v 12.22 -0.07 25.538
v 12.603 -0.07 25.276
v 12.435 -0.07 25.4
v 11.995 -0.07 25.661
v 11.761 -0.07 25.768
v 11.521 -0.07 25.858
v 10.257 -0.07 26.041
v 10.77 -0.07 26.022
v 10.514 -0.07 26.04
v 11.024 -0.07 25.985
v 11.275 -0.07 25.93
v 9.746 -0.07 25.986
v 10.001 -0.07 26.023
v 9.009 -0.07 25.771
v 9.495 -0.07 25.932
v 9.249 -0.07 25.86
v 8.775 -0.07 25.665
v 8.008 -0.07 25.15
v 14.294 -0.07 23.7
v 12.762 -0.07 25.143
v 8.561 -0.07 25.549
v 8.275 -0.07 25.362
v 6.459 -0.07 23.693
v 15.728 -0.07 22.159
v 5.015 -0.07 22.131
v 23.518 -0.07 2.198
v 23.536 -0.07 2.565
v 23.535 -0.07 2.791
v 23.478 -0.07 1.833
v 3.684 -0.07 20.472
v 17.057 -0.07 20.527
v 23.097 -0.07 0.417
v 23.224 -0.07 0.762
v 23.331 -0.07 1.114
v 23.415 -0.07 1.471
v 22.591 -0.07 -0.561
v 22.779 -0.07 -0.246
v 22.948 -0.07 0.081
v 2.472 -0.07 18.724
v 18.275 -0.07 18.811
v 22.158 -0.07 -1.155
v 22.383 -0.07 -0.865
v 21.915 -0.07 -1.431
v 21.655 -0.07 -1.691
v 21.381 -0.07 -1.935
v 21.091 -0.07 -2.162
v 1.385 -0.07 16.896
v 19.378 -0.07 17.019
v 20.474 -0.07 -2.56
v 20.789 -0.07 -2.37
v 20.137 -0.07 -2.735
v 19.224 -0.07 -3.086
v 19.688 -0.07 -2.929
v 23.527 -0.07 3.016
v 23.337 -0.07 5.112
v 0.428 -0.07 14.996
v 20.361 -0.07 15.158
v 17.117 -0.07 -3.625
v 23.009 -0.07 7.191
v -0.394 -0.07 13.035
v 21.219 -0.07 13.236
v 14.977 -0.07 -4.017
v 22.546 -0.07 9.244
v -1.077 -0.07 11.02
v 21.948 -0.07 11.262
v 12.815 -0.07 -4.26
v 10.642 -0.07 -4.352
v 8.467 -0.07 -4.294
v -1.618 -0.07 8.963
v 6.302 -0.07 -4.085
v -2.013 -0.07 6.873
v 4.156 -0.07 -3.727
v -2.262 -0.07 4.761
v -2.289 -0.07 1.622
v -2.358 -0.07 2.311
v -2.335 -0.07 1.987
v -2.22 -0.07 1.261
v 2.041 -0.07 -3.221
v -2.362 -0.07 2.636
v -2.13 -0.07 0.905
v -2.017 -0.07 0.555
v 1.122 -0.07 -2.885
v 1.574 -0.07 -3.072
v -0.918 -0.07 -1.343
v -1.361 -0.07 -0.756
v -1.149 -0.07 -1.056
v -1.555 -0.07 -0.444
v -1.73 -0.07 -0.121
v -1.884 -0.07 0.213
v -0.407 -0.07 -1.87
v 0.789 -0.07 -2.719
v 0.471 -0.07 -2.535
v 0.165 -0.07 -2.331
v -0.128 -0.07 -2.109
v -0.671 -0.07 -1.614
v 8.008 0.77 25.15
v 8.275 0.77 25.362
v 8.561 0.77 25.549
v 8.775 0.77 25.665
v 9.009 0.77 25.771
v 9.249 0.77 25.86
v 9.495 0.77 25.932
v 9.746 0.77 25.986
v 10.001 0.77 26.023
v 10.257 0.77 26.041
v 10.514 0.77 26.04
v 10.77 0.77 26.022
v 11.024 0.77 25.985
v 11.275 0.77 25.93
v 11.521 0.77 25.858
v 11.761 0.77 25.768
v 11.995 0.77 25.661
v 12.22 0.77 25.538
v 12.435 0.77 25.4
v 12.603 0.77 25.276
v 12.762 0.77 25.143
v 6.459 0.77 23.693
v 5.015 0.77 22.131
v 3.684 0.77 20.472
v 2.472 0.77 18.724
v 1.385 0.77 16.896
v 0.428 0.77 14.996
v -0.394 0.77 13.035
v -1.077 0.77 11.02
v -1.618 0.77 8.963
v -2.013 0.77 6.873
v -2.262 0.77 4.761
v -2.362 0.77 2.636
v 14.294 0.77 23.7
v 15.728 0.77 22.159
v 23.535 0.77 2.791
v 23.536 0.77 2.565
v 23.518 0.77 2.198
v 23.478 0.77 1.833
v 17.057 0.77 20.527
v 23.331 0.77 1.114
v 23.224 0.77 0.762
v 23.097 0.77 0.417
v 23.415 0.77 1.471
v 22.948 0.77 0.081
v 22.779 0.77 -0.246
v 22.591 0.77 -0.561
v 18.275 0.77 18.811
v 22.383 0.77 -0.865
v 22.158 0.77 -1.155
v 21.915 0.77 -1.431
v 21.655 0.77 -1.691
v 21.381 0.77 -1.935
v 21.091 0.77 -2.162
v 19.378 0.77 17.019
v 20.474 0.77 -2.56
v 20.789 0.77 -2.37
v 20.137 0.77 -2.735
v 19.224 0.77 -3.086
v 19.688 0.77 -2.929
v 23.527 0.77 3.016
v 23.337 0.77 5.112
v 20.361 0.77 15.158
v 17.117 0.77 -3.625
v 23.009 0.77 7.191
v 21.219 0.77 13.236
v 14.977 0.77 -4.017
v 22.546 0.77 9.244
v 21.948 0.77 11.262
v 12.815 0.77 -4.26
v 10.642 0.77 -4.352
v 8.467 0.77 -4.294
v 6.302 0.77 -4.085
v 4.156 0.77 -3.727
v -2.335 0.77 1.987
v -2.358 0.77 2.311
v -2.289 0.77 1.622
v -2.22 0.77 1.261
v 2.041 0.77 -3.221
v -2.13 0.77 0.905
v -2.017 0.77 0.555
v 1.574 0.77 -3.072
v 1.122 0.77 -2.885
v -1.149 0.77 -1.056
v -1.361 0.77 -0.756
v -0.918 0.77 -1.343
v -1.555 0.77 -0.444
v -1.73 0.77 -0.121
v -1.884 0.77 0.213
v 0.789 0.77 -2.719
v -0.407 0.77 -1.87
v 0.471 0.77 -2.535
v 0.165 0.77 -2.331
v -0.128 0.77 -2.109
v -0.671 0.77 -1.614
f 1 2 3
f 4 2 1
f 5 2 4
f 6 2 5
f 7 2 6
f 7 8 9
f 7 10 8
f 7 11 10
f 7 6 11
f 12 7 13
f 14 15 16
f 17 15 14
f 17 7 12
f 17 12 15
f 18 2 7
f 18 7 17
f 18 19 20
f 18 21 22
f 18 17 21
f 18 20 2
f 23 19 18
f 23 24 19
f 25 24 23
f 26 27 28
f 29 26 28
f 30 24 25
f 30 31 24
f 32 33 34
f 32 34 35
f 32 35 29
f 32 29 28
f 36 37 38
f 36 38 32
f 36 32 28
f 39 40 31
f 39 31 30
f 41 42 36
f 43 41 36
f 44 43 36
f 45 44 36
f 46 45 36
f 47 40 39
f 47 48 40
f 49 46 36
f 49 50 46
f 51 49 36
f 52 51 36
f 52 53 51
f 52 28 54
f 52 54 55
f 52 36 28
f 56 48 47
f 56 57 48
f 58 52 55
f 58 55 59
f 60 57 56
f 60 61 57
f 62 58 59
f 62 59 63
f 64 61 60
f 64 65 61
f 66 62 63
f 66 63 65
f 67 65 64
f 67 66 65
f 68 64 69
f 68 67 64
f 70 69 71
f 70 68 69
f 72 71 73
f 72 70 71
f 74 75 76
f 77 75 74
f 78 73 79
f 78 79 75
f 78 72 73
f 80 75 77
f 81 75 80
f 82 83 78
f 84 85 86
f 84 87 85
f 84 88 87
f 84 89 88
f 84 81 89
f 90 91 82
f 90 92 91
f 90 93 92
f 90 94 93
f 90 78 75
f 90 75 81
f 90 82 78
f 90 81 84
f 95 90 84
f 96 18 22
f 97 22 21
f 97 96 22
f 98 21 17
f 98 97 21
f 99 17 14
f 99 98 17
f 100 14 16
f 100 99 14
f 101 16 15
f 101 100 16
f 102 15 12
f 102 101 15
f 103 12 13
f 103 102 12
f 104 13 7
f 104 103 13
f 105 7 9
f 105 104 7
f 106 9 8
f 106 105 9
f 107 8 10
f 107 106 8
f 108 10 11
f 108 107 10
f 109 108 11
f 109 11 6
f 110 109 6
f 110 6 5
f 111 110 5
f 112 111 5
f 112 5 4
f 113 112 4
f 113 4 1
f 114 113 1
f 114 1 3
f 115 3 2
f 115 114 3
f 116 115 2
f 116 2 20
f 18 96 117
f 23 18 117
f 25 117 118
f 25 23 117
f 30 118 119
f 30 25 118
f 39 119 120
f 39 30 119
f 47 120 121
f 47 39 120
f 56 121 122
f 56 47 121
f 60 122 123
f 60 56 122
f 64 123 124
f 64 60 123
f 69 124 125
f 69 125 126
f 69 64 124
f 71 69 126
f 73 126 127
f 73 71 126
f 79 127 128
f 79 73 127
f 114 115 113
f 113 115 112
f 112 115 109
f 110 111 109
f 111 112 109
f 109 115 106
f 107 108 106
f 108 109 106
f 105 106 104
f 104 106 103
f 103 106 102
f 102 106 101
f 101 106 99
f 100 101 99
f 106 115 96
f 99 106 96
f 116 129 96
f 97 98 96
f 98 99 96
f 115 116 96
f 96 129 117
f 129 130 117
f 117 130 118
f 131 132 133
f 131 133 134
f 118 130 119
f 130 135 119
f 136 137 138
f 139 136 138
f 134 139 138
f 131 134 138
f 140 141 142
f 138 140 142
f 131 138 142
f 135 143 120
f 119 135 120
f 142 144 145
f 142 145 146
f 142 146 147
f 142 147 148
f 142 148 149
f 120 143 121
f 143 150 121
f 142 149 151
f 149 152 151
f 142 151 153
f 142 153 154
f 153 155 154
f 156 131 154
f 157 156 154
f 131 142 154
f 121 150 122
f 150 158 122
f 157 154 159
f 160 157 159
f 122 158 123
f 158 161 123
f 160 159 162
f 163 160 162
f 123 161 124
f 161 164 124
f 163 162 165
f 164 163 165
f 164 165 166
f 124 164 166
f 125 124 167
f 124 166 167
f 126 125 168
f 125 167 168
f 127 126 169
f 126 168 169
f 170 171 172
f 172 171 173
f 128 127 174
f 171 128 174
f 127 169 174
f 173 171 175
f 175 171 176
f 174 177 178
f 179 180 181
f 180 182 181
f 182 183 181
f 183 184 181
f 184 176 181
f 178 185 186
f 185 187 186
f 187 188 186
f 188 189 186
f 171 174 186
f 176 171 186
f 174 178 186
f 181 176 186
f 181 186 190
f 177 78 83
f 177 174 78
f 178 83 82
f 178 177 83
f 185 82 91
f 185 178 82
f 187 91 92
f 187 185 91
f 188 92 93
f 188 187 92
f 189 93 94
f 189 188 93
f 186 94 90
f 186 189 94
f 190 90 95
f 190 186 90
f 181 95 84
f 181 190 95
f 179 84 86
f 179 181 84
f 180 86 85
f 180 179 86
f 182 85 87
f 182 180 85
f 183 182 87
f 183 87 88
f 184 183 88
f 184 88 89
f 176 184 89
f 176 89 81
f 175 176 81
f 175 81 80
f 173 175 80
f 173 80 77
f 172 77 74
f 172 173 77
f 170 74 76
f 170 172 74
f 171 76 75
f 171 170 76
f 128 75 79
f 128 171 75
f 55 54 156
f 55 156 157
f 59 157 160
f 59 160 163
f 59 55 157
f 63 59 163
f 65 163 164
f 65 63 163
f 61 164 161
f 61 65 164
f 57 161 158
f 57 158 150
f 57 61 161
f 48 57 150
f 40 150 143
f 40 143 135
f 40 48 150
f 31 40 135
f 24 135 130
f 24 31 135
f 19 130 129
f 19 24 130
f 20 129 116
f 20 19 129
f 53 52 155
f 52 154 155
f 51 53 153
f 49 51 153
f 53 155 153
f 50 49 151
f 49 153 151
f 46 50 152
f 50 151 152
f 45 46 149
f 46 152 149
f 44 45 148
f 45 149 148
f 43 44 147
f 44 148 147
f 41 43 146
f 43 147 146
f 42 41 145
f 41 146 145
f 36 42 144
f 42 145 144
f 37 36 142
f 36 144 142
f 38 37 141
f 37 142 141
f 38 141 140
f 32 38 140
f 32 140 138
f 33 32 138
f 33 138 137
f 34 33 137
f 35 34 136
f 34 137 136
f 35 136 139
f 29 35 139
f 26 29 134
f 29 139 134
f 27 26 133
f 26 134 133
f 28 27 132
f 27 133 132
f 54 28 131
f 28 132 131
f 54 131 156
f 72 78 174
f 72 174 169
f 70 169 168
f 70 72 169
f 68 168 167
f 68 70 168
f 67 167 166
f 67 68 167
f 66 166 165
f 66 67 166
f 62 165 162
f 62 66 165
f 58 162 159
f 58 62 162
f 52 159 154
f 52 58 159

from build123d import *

# Parameters (mm, degrees)
BOSS_EXTRUDE1_DEPTH = 0.7
FILLET1_R           = 5
FILLET2_R           = 5
FILLET3_R           = 3
SCALE1_SCALE        = 1.2


with BuildPart() as part:
    # Sketch1 → Boss-Extrude1 (new body)
    with BuildSketch(Plane(origin=(0, 0, 0), x_dir=(1, 0, 0), z_dir=(0, 1, 0))):
        with BuildLine():
            ThreePointArc((0, 0), (10.674582486, 2.159113438), (21.303319094, -0.215426558))
            ThreePointArc((21.303319094, -0.215426558), (18.980175942, -13.538262848), (10.41005245, -24))
            ThreePointArc((10.41005245, -24), (1.872716321, -13.445396703), (0, 0))
        make_face()
    extrude(amount=BOSS_EXTRUDE1_DEPTH)

    # Fillet1
    fillet1_edges = [part.edges().sort_by_distance(p)[0] for p in [
        (21.303319094, 0.35, 0.215426558),
    ]]
    fillet(fillet1_edges, radius=FILLET1_R)

    # Fillet2
    fillet2_edges = [part.edges().sort_by_distance(p)[0] for p in [
        (0, 0.35, 0),
    ]]
    fillet(fillet2_edges, radius=FILLET2_R)

    # Fillet3
    fillet3_edges = [part.edges().sort_by_distance(p)[0] for p in [
        (10.41005245, 0.35, 24),
    ]]
    fillet(fillet3_edges, radius=FILLET3_R)


with BuildPart() as part_1:
    # Scale1: scaled about (10.489972613, 0.35, 8.803486941)
    add(part.part.scale(SCALE1_SCALE).moved(Location((-2.097994523, -0.07, -1.760697388))))


solid = part_1.part
